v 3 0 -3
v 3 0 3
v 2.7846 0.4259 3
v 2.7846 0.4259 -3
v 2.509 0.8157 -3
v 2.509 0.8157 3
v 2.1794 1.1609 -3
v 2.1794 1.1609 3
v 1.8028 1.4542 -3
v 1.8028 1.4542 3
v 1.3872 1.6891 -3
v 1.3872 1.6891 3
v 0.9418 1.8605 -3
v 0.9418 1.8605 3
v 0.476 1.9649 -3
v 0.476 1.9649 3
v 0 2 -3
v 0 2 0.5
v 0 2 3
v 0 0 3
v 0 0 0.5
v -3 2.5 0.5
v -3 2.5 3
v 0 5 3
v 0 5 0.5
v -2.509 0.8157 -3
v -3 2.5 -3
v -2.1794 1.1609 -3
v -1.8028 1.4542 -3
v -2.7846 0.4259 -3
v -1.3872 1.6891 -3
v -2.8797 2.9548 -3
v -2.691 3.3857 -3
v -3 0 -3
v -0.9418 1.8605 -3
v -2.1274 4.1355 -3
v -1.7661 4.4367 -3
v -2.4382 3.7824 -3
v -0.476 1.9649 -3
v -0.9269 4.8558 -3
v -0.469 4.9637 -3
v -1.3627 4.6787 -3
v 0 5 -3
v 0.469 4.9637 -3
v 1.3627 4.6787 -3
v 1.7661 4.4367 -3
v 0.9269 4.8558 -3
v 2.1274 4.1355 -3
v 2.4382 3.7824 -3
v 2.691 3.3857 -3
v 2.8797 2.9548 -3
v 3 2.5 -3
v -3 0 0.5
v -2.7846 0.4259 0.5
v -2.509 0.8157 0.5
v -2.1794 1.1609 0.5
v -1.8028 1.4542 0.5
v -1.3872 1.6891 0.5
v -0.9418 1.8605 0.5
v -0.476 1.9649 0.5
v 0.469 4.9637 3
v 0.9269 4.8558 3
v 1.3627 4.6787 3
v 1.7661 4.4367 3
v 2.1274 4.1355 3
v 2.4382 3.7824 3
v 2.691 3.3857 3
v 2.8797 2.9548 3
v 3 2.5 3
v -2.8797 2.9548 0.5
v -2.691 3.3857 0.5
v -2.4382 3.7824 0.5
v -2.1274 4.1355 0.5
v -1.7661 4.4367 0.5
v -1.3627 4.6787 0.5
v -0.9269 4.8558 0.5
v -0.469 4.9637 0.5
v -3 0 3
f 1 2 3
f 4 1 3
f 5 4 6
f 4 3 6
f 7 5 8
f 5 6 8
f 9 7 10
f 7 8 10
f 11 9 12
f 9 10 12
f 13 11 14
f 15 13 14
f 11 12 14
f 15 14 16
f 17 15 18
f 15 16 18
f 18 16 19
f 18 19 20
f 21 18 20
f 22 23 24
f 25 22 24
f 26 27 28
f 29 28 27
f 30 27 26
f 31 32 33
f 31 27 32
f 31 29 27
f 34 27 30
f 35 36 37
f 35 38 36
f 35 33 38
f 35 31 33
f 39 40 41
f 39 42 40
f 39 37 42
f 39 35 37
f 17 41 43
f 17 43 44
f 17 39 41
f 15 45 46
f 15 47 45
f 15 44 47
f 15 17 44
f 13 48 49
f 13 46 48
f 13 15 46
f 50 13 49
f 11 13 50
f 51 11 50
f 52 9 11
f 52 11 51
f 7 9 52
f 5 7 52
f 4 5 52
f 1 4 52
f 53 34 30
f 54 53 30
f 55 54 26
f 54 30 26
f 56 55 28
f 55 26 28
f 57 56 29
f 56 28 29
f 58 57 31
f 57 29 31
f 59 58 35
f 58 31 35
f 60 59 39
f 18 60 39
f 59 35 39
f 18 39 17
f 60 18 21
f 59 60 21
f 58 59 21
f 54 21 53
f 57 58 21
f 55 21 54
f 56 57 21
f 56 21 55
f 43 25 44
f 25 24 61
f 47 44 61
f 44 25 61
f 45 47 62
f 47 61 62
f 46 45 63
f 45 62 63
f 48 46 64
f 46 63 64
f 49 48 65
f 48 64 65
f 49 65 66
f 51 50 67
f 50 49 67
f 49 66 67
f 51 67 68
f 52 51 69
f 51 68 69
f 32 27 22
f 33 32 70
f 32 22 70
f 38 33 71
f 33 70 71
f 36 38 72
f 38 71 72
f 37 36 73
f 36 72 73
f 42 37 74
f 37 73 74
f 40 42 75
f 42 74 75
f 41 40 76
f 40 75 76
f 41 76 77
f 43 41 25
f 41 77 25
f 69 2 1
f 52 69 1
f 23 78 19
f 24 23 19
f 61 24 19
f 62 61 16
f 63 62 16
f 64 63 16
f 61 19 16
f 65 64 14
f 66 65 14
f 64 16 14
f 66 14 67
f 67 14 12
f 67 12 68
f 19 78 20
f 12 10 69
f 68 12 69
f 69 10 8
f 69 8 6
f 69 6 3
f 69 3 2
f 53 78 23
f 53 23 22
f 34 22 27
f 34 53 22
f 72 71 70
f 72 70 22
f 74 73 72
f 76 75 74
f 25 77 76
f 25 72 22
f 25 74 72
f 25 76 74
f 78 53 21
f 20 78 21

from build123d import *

# Parameters (mm, degrees)
SKETCH1_W           = 6
SKETCH1_H           = 6
BOSS_EXTRUDE1_DEPTH = 5
CUT_EXTRUDE4_DEPTH  = 12.5
CUT_EXTRUDE5_DEPTH  = 2.5
CUT_EXTRUDE6_DEPTH  = 3.5


with BuildPart() as part:
    # Sketch1 → Boss-Extrude1 (new body)
    with BuildSketch(Plane(origin=(0, 0, 0), x_dir=(1, 0, 0), z_dir=(0, 1, 0))):
        Rectangle(SKETCH1_W, SKETCH1_H)
    extrude(amount=BOSS_EXTRUDE1_DEPTH)

    # Sketch5 → Cut-Extrude4 (cut)
    with BuildSketch(Plane.XY.offset(3)):
        with BuildLine():
            Line((-3, 5), (-3, 2.5))
            ThreePointArc((-3, 2.5), (-1.952562419, 4.293074903), (0, 5))
            Line((0, 5), (-3, 5))
        make_face()
        with BuildLine():
            ThreePointArc((0, 5), (1.952562419, 4.293074903), (3, 2.5))
            Line((3, 2.5), (3, 5))
            Line((3, 5), (0, 5))
        make_face()
        with BuildLine():
            ThreePointArc((3, 0), (1.802775638, 1.454163457), (0, 2))
            Line((0, 2), (0, 0))
            Line((0, 0), (3, 0))
        make_face()
    extrude(amount=-CUT_EXTRUDE4_DEPTH, mode=Mode.SUBTRACT)

    # Sketch6 → Cut-Extrude5 (cut)
    with BuildSketch(Plane.XY.offset(3)):
        with BuildLine():
            Line((-3, 2.5), (0, 5))
            ThreePointArc((0, 5), (-1.952562419, 4.293074903), (-3, 2.5))
        make_face()
    extrude(amount=-CUT_EXTRUDE5_DEPTH, mode=Mode.SUBTRACT)

    # Sketch7 → Cut-Extrude6 (cut)
    with BuildSketch(Plane(origin=(0, 0, -3), x_dir=(-1, 0, 0), z_dir=(0, 0, -1))):
        with BuildLine():
            Line((0, 2), (0, 0))
            Line((0, 0), (3, 0))
            ThreePointArc((3, 0), (1.802775638, 1.454163457), (0, 2))
        make_face()
    extrude(amount=-CUT_EXTRUDE6_DEPTH, mode=Mode.SUBTRACT)


solid = part.part
